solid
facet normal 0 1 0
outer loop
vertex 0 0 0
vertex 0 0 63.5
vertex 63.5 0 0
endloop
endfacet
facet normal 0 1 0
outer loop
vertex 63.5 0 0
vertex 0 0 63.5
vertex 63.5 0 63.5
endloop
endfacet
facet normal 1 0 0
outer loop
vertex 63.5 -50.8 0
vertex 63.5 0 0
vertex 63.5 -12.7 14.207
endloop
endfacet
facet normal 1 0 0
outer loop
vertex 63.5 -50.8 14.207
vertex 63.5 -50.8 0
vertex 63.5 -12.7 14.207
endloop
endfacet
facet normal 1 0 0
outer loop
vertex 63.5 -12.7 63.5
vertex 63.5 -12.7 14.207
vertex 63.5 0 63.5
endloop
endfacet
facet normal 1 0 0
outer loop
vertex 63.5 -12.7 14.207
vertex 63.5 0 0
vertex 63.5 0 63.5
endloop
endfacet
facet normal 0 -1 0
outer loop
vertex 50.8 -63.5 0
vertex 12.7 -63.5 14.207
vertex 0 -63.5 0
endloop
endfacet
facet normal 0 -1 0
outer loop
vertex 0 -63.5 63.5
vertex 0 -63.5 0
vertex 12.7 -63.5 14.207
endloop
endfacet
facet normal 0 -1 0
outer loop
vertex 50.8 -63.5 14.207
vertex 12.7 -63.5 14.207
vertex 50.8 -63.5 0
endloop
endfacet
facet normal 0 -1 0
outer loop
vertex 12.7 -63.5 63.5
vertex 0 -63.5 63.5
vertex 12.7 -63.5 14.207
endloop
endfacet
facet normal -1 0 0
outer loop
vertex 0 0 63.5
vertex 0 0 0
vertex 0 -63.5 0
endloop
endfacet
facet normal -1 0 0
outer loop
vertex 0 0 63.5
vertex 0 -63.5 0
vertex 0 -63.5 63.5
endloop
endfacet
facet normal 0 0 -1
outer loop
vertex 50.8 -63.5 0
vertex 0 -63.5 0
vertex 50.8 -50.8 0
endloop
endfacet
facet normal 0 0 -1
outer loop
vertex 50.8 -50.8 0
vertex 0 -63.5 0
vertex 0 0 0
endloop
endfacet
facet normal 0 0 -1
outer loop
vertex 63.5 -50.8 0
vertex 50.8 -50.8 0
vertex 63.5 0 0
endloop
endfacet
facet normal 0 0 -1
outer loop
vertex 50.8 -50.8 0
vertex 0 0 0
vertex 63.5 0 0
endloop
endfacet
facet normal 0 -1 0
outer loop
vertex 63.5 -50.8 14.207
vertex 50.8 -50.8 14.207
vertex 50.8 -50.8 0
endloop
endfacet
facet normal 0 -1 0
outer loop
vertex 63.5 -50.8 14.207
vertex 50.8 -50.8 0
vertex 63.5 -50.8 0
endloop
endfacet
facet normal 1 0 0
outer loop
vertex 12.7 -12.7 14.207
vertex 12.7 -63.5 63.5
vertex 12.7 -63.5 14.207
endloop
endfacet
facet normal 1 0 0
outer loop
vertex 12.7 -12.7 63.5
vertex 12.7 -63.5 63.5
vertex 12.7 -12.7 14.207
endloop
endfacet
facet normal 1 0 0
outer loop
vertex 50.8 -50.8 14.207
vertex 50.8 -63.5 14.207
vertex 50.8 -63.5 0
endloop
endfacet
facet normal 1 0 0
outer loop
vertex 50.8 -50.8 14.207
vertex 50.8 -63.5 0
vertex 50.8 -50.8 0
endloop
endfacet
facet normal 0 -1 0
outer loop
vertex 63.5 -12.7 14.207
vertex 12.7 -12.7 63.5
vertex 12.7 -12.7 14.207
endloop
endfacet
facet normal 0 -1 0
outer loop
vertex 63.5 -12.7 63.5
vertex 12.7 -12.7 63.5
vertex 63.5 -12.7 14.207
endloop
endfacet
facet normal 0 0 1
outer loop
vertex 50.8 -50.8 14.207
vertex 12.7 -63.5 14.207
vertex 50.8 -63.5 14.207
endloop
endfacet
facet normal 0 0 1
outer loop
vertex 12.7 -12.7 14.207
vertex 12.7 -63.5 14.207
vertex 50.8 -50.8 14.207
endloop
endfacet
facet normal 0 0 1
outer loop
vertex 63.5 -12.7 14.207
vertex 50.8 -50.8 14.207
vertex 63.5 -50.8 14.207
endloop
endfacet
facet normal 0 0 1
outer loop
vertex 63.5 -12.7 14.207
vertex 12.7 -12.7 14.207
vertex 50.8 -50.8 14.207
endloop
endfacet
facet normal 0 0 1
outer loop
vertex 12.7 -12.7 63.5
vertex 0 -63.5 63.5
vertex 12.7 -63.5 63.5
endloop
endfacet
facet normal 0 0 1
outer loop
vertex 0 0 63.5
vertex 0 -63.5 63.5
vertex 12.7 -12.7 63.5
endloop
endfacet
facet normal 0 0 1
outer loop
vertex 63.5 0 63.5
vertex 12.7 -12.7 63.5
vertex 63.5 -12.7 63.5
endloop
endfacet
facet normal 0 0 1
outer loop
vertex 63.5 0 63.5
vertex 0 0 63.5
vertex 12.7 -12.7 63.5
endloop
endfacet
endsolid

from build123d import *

# Parameters (mm, degrees)
F0_W     = 63.5
F0_H     = 63.5
F1_DEPTH = 63.5
F2_W     = 50.8
F2_H     = 50.8
F3_DEPTH = 49.293023
F4_W     = 12.7
F4_H     = 12.7
F5_DEPTH = 25.4


with BuildPart() as f1:
    # F0 (on Front) → F1 (new body)
    with BuildSketch(Plane.XZ):
        with Locations((31.75, 31.75)):
            Rectangle(F0_W, F0_H)
    extrude(amount=F1_DEPTH)

    # F2 (on face) → F3 (cut)
    with BuildSketch(Plane.XY.offset(63.5)):
        with Locations((38.1, -38.1)):
            Rectangle(F2_W, F2_H)
    extrude(amount=-F3_DEPTH, mode=Mode.SUBTRACT)

    # F4 (on face) → F5 (cut)
    with BuildSketch(Plane.XY.offset(14.206977)):
        with Locations((57.15, -57.15)):
            Rectangle(F4_W, F4_H)
    extrude(amount=-F5_DEPTH, mode=Mode.SUBTRACT)


solid = f1.part
